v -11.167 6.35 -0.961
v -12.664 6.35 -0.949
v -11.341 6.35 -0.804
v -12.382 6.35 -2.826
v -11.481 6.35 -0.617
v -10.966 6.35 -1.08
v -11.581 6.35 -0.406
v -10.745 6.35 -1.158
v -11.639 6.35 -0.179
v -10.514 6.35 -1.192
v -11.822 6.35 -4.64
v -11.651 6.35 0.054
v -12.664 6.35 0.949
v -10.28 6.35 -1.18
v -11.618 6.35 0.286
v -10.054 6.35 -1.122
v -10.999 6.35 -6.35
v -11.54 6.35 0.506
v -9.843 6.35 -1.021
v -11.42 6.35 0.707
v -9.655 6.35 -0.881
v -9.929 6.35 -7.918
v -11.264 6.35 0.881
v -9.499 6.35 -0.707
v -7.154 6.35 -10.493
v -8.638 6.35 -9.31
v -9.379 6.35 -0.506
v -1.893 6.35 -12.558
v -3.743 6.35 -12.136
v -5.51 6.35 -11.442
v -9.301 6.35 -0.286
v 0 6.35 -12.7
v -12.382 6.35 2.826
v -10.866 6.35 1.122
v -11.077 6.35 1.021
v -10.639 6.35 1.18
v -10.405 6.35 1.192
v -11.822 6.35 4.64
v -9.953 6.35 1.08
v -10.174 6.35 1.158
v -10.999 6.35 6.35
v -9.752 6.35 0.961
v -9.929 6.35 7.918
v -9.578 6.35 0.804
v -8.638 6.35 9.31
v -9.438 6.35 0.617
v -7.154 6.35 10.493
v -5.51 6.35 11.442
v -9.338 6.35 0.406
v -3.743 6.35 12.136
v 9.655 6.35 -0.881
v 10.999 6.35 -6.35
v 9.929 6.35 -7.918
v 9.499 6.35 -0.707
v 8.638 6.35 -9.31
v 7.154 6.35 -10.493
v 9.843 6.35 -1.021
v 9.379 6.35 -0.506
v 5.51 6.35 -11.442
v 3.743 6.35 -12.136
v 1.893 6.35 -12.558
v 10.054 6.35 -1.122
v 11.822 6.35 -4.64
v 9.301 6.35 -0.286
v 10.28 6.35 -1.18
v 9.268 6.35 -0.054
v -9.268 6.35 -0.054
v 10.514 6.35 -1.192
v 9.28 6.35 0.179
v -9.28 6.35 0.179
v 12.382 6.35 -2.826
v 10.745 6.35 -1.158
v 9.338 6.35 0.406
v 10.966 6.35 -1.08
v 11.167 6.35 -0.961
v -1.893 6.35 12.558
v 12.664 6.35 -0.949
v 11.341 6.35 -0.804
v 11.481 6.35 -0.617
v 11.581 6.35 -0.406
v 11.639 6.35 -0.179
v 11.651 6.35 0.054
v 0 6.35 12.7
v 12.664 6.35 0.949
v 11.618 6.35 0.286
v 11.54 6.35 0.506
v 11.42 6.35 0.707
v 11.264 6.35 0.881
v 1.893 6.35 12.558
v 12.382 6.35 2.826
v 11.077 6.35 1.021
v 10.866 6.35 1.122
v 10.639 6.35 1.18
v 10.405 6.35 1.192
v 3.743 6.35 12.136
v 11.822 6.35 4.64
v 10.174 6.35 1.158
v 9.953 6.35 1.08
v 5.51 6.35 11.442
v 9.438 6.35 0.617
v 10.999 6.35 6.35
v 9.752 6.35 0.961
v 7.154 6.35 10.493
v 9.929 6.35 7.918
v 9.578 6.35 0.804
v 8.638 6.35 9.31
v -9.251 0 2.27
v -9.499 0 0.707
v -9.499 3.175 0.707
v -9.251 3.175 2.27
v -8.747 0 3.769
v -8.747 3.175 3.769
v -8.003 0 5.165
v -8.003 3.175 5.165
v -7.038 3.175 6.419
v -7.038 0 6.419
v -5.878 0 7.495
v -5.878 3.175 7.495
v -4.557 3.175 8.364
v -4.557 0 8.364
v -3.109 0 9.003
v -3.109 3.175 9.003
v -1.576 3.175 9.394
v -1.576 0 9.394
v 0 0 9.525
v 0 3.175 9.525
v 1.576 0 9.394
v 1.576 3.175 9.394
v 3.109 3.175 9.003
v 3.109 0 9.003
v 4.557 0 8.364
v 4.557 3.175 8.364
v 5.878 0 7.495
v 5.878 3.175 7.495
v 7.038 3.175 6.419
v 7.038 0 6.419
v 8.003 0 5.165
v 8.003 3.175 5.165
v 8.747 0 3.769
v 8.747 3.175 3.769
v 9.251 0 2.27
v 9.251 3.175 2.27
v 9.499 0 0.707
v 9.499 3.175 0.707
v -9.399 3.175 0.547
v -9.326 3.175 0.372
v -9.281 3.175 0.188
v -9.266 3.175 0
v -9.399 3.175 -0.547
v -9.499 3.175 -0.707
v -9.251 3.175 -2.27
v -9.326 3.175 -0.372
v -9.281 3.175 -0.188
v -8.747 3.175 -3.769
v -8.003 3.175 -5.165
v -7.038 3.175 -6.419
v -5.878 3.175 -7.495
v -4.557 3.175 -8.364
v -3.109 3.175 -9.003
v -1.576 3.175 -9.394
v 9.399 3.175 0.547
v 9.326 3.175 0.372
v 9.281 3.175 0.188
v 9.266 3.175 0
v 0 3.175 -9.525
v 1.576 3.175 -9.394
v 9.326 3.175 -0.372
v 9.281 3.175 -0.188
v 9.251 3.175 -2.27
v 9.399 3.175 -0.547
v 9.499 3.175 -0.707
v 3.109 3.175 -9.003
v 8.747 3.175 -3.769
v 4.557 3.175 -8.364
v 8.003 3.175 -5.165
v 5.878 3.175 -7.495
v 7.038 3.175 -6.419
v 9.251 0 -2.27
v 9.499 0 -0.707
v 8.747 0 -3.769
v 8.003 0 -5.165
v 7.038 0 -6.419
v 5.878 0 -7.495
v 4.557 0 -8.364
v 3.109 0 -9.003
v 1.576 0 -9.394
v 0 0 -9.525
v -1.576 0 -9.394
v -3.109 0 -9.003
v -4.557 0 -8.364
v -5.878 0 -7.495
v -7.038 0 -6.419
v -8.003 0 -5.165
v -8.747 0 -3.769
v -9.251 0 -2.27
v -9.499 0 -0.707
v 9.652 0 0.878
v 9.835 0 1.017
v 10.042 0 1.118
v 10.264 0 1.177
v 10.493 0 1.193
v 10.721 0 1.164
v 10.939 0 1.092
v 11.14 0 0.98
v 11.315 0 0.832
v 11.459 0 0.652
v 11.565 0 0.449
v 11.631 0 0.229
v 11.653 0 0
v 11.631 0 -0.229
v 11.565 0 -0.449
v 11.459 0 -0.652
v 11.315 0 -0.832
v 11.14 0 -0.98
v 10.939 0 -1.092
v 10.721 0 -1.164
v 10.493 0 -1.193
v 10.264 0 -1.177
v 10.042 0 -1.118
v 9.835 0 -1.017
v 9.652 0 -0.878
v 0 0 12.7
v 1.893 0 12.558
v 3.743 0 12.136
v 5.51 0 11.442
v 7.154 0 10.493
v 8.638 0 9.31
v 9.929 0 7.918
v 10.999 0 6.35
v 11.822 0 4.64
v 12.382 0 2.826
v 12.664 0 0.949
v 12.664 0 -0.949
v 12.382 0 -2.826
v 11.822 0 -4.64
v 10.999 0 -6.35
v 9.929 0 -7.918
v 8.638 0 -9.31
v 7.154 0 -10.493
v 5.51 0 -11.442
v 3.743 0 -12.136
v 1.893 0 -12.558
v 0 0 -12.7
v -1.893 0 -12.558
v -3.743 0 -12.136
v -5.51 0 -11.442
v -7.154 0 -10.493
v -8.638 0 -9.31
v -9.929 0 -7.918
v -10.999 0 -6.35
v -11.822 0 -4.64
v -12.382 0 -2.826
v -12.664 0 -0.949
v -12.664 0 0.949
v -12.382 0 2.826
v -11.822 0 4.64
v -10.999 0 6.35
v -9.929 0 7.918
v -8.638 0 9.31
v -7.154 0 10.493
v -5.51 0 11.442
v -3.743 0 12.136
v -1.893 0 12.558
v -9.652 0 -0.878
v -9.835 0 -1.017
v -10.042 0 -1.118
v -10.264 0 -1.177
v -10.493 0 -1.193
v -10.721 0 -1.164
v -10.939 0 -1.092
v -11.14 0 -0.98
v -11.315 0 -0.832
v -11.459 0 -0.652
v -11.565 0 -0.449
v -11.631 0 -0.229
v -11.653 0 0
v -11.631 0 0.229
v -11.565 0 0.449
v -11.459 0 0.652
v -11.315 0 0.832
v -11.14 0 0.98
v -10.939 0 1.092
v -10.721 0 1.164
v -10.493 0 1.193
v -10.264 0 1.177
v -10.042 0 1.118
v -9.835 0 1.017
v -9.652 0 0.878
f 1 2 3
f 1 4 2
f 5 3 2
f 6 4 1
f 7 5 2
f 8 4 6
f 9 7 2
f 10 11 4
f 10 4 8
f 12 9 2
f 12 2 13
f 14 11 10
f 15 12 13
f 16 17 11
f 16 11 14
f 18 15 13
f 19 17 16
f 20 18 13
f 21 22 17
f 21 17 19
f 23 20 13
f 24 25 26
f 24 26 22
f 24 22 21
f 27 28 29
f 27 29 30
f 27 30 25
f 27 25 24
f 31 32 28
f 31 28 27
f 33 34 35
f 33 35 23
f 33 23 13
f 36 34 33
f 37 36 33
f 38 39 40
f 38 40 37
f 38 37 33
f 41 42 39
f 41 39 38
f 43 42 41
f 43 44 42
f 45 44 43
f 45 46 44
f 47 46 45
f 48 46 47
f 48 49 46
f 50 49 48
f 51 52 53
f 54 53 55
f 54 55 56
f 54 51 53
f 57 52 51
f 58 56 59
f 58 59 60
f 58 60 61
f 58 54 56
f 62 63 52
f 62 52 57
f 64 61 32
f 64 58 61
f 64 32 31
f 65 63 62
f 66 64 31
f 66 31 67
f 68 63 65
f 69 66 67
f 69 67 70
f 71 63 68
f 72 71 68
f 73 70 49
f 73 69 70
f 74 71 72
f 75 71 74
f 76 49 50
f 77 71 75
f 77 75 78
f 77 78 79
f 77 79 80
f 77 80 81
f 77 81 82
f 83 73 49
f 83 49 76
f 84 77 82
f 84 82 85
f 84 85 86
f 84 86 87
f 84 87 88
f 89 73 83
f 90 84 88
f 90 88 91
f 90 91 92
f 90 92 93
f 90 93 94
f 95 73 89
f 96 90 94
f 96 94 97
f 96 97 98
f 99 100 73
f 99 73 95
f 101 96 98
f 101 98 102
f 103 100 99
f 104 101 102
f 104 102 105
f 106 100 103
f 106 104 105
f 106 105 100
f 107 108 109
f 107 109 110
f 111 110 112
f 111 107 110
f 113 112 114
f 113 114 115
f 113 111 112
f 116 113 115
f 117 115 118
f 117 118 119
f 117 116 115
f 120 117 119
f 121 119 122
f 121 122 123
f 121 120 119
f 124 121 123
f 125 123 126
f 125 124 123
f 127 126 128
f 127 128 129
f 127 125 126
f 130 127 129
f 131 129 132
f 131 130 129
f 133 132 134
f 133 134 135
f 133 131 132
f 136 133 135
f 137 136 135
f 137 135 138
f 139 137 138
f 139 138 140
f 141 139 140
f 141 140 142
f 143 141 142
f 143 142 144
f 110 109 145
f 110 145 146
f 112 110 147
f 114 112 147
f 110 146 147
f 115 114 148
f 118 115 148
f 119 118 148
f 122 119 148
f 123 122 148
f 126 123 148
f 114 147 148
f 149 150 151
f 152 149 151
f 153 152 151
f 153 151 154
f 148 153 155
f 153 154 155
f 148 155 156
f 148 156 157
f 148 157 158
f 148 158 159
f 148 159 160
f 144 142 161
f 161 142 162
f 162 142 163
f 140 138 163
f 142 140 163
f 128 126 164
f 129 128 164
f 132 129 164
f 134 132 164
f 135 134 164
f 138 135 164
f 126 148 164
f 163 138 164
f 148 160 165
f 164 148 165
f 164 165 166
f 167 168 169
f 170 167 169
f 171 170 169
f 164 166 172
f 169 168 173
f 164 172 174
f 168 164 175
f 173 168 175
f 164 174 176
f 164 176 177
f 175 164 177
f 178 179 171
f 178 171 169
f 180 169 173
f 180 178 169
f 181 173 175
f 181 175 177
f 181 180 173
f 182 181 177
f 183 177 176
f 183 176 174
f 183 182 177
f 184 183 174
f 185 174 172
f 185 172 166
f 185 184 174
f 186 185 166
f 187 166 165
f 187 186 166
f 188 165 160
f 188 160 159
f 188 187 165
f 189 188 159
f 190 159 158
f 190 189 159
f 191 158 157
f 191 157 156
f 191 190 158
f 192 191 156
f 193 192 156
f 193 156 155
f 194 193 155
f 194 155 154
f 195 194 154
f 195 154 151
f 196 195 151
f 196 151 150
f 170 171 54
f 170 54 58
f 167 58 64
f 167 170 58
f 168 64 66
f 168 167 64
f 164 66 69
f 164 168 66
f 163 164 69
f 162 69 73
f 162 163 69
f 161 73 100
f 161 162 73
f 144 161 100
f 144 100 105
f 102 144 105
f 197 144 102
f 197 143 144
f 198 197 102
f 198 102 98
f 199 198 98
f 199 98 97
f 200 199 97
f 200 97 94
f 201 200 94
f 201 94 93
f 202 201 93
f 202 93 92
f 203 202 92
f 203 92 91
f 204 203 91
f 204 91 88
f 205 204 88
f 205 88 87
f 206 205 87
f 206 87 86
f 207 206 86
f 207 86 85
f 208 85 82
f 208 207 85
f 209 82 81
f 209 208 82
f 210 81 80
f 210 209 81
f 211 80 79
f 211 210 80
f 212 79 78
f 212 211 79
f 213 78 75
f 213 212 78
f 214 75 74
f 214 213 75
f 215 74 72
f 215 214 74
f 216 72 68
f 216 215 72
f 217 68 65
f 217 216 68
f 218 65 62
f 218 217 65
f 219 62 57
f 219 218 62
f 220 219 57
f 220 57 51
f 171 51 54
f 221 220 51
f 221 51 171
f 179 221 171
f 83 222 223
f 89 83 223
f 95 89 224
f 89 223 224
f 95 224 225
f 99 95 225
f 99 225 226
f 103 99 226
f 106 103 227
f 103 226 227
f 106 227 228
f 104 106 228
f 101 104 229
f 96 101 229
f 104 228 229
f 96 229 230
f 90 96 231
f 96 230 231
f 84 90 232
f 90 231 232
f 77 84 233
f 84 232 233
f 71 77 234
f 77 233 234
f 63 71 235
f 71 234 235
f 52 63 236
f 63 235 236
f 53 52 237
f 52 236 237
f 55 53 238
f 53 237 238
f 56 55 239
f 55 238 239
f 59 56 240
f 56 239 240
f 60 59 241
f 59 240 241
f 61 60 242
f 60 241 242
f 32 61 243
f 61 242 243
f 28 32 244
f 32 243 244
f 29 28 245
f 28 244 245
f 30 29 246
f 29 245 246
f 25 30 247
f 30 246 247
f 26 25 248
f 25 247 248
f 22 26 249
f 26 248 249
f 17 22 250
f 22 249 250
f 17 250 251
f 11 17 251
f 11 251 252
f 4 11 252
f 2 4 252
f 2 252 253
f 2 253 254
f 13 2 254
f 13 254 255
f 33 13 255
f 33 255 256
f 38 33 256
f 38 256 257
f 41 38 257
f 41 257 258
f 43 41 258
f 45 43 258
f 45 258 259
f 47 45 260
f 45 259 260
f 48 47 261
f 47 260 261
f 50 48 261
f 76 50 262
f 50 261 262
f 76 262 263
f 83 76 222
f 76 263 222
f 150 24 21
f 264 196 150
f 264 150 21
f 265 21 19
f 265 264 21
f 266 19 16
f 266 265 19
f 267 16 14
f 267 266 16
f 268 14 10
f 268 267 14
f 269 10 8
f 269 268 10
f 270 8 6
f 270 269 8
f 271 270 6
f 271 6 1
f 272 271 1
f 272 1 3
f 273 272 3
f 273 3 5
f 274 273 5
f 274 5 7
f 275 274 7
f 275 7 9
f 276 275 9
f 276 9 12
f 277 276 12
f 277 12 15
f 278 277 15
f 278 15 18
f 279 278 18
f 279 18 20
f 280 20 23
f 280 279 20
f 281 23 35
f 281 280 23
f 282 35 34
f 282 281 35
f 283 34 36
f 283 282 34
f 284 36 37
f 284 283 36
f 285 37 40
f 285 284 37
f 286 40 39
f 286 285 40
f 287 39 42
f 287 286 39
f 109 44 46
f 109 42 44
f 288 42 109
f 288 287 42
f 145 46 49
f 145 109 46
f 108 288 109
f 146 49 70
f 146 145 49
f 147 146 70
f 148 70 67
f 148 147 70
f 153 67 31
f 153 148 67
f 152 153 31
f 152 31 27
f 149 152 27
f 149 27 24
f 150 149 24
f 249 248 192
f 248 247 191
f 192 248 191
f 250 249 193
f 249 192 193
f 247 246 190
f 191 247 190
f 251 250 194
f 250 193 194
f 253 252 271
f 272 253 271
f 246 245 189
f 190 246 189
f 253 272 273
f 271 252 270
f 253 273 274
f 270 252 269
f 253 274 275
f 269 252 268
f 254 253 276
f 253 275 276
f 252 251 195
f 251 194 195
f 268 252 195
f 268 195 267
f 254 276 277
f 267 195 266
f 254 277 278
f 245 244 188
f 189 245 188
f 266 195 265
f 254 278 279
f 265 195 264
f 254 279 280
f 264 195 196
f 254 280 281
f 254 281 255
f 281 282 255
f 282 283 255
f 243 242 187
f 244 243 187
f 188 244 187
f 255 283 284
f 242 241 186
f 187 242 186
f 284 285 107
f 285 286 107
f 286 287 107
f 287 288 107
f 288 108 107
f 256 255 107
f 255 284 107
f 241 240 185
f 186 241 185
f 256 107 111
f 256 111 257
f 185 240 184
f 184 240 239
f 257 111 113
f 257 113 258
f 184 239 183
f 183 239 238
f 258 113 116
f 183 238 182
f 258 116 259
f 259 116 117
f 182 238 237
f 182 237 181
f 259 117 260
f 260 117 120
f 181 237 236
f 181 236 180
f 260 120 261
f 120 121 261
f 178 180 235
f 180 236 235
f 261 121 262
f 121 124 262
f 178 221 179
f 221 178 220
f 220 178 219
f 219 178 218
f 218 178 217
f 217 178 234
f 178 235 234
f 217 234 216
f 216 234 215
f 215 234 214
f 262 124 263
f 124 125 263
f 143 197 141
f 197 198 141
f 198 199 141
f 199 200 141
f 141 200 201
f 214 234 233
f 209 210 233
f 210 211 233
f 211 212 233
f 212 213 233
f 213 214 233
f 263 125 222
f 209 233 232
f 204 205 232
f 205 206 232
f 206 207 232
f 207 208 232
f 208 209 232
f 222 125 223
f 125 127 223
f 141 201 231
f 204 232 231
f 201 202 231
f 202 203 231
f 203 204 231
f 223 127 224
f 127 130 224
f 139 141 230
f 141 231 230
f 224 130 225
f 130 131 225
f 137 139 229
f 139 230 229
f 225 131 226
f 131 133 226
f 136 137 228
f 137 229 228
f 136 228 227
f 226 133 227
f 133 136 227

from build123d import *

# Parameters (mm, degrees)
SKETCH1_R           = 12.7
BOSS_EXTRUDE1_DEPTH = 6.35
CUT_EXTRUDE1_DEPTH  = 3.175
SKETCH1_5_R         = 1.193106662
CUT_EXTRUDE2_DEPTH  = 20.05


with BuildPart() as part:
    # Sketch1 → Boss-Extrude1 (new body)
    with BuildSketch(Plane(origin=(0, 0, 0), x_dir=(1, 0, 0), z_dir=(0, 1, 0))):
        Circle(SKETCH1_R)
    extrude(amount=BOSS_EXTRUDE1_DEPTH)

    # Sketch1<3> → Cut-Extrude1 (cut)
    with BuildSketch(Plane(origin=(0, 0, 0), x_dir=(1, 0, 0), z_dir=(0, 1, 0))):
        with BuildLine():
            ThreePointArc((-9.498704201, 0.707278937), (-9.26646174, 0), (-9.498704201, -0.707278937))
            ThreePointArc((-9.498704201, -0.707278937), (0, -9.525), (9.498704201, -0.707278937))
            ThreePointArc((9.498704201, -0.707278937), (9.26646174, 0), (9.498704201, 0.707278937))
            ThreePointArc((9.498704201, 0.707278937), (0, 9.525), (-9.498704201, 0.707278937))
        make_face()
    extrude(amount=CUT_EXTRUDE1_DEPTH, mode=Mode.SUBTRACT)

    # Sketch1<5> → Cut-Extrude2 (cut, through all)
    with BuildSketch(Plane(origin=(0, 0, 0), x_dir=(1, 0, 0), z_dir=(0, 1, 0))):
        with Locations((-10.459568402, 0)):
            Circle(SKETCH1_5_R)
        with Locations((10.459568402, 0)):
            Circle(SKETCH1_5_R)
    extrude(amount=CUT_EXTRUDE2_DEPTH, mode=Mode.SUBTRACT)


solid = part.part
